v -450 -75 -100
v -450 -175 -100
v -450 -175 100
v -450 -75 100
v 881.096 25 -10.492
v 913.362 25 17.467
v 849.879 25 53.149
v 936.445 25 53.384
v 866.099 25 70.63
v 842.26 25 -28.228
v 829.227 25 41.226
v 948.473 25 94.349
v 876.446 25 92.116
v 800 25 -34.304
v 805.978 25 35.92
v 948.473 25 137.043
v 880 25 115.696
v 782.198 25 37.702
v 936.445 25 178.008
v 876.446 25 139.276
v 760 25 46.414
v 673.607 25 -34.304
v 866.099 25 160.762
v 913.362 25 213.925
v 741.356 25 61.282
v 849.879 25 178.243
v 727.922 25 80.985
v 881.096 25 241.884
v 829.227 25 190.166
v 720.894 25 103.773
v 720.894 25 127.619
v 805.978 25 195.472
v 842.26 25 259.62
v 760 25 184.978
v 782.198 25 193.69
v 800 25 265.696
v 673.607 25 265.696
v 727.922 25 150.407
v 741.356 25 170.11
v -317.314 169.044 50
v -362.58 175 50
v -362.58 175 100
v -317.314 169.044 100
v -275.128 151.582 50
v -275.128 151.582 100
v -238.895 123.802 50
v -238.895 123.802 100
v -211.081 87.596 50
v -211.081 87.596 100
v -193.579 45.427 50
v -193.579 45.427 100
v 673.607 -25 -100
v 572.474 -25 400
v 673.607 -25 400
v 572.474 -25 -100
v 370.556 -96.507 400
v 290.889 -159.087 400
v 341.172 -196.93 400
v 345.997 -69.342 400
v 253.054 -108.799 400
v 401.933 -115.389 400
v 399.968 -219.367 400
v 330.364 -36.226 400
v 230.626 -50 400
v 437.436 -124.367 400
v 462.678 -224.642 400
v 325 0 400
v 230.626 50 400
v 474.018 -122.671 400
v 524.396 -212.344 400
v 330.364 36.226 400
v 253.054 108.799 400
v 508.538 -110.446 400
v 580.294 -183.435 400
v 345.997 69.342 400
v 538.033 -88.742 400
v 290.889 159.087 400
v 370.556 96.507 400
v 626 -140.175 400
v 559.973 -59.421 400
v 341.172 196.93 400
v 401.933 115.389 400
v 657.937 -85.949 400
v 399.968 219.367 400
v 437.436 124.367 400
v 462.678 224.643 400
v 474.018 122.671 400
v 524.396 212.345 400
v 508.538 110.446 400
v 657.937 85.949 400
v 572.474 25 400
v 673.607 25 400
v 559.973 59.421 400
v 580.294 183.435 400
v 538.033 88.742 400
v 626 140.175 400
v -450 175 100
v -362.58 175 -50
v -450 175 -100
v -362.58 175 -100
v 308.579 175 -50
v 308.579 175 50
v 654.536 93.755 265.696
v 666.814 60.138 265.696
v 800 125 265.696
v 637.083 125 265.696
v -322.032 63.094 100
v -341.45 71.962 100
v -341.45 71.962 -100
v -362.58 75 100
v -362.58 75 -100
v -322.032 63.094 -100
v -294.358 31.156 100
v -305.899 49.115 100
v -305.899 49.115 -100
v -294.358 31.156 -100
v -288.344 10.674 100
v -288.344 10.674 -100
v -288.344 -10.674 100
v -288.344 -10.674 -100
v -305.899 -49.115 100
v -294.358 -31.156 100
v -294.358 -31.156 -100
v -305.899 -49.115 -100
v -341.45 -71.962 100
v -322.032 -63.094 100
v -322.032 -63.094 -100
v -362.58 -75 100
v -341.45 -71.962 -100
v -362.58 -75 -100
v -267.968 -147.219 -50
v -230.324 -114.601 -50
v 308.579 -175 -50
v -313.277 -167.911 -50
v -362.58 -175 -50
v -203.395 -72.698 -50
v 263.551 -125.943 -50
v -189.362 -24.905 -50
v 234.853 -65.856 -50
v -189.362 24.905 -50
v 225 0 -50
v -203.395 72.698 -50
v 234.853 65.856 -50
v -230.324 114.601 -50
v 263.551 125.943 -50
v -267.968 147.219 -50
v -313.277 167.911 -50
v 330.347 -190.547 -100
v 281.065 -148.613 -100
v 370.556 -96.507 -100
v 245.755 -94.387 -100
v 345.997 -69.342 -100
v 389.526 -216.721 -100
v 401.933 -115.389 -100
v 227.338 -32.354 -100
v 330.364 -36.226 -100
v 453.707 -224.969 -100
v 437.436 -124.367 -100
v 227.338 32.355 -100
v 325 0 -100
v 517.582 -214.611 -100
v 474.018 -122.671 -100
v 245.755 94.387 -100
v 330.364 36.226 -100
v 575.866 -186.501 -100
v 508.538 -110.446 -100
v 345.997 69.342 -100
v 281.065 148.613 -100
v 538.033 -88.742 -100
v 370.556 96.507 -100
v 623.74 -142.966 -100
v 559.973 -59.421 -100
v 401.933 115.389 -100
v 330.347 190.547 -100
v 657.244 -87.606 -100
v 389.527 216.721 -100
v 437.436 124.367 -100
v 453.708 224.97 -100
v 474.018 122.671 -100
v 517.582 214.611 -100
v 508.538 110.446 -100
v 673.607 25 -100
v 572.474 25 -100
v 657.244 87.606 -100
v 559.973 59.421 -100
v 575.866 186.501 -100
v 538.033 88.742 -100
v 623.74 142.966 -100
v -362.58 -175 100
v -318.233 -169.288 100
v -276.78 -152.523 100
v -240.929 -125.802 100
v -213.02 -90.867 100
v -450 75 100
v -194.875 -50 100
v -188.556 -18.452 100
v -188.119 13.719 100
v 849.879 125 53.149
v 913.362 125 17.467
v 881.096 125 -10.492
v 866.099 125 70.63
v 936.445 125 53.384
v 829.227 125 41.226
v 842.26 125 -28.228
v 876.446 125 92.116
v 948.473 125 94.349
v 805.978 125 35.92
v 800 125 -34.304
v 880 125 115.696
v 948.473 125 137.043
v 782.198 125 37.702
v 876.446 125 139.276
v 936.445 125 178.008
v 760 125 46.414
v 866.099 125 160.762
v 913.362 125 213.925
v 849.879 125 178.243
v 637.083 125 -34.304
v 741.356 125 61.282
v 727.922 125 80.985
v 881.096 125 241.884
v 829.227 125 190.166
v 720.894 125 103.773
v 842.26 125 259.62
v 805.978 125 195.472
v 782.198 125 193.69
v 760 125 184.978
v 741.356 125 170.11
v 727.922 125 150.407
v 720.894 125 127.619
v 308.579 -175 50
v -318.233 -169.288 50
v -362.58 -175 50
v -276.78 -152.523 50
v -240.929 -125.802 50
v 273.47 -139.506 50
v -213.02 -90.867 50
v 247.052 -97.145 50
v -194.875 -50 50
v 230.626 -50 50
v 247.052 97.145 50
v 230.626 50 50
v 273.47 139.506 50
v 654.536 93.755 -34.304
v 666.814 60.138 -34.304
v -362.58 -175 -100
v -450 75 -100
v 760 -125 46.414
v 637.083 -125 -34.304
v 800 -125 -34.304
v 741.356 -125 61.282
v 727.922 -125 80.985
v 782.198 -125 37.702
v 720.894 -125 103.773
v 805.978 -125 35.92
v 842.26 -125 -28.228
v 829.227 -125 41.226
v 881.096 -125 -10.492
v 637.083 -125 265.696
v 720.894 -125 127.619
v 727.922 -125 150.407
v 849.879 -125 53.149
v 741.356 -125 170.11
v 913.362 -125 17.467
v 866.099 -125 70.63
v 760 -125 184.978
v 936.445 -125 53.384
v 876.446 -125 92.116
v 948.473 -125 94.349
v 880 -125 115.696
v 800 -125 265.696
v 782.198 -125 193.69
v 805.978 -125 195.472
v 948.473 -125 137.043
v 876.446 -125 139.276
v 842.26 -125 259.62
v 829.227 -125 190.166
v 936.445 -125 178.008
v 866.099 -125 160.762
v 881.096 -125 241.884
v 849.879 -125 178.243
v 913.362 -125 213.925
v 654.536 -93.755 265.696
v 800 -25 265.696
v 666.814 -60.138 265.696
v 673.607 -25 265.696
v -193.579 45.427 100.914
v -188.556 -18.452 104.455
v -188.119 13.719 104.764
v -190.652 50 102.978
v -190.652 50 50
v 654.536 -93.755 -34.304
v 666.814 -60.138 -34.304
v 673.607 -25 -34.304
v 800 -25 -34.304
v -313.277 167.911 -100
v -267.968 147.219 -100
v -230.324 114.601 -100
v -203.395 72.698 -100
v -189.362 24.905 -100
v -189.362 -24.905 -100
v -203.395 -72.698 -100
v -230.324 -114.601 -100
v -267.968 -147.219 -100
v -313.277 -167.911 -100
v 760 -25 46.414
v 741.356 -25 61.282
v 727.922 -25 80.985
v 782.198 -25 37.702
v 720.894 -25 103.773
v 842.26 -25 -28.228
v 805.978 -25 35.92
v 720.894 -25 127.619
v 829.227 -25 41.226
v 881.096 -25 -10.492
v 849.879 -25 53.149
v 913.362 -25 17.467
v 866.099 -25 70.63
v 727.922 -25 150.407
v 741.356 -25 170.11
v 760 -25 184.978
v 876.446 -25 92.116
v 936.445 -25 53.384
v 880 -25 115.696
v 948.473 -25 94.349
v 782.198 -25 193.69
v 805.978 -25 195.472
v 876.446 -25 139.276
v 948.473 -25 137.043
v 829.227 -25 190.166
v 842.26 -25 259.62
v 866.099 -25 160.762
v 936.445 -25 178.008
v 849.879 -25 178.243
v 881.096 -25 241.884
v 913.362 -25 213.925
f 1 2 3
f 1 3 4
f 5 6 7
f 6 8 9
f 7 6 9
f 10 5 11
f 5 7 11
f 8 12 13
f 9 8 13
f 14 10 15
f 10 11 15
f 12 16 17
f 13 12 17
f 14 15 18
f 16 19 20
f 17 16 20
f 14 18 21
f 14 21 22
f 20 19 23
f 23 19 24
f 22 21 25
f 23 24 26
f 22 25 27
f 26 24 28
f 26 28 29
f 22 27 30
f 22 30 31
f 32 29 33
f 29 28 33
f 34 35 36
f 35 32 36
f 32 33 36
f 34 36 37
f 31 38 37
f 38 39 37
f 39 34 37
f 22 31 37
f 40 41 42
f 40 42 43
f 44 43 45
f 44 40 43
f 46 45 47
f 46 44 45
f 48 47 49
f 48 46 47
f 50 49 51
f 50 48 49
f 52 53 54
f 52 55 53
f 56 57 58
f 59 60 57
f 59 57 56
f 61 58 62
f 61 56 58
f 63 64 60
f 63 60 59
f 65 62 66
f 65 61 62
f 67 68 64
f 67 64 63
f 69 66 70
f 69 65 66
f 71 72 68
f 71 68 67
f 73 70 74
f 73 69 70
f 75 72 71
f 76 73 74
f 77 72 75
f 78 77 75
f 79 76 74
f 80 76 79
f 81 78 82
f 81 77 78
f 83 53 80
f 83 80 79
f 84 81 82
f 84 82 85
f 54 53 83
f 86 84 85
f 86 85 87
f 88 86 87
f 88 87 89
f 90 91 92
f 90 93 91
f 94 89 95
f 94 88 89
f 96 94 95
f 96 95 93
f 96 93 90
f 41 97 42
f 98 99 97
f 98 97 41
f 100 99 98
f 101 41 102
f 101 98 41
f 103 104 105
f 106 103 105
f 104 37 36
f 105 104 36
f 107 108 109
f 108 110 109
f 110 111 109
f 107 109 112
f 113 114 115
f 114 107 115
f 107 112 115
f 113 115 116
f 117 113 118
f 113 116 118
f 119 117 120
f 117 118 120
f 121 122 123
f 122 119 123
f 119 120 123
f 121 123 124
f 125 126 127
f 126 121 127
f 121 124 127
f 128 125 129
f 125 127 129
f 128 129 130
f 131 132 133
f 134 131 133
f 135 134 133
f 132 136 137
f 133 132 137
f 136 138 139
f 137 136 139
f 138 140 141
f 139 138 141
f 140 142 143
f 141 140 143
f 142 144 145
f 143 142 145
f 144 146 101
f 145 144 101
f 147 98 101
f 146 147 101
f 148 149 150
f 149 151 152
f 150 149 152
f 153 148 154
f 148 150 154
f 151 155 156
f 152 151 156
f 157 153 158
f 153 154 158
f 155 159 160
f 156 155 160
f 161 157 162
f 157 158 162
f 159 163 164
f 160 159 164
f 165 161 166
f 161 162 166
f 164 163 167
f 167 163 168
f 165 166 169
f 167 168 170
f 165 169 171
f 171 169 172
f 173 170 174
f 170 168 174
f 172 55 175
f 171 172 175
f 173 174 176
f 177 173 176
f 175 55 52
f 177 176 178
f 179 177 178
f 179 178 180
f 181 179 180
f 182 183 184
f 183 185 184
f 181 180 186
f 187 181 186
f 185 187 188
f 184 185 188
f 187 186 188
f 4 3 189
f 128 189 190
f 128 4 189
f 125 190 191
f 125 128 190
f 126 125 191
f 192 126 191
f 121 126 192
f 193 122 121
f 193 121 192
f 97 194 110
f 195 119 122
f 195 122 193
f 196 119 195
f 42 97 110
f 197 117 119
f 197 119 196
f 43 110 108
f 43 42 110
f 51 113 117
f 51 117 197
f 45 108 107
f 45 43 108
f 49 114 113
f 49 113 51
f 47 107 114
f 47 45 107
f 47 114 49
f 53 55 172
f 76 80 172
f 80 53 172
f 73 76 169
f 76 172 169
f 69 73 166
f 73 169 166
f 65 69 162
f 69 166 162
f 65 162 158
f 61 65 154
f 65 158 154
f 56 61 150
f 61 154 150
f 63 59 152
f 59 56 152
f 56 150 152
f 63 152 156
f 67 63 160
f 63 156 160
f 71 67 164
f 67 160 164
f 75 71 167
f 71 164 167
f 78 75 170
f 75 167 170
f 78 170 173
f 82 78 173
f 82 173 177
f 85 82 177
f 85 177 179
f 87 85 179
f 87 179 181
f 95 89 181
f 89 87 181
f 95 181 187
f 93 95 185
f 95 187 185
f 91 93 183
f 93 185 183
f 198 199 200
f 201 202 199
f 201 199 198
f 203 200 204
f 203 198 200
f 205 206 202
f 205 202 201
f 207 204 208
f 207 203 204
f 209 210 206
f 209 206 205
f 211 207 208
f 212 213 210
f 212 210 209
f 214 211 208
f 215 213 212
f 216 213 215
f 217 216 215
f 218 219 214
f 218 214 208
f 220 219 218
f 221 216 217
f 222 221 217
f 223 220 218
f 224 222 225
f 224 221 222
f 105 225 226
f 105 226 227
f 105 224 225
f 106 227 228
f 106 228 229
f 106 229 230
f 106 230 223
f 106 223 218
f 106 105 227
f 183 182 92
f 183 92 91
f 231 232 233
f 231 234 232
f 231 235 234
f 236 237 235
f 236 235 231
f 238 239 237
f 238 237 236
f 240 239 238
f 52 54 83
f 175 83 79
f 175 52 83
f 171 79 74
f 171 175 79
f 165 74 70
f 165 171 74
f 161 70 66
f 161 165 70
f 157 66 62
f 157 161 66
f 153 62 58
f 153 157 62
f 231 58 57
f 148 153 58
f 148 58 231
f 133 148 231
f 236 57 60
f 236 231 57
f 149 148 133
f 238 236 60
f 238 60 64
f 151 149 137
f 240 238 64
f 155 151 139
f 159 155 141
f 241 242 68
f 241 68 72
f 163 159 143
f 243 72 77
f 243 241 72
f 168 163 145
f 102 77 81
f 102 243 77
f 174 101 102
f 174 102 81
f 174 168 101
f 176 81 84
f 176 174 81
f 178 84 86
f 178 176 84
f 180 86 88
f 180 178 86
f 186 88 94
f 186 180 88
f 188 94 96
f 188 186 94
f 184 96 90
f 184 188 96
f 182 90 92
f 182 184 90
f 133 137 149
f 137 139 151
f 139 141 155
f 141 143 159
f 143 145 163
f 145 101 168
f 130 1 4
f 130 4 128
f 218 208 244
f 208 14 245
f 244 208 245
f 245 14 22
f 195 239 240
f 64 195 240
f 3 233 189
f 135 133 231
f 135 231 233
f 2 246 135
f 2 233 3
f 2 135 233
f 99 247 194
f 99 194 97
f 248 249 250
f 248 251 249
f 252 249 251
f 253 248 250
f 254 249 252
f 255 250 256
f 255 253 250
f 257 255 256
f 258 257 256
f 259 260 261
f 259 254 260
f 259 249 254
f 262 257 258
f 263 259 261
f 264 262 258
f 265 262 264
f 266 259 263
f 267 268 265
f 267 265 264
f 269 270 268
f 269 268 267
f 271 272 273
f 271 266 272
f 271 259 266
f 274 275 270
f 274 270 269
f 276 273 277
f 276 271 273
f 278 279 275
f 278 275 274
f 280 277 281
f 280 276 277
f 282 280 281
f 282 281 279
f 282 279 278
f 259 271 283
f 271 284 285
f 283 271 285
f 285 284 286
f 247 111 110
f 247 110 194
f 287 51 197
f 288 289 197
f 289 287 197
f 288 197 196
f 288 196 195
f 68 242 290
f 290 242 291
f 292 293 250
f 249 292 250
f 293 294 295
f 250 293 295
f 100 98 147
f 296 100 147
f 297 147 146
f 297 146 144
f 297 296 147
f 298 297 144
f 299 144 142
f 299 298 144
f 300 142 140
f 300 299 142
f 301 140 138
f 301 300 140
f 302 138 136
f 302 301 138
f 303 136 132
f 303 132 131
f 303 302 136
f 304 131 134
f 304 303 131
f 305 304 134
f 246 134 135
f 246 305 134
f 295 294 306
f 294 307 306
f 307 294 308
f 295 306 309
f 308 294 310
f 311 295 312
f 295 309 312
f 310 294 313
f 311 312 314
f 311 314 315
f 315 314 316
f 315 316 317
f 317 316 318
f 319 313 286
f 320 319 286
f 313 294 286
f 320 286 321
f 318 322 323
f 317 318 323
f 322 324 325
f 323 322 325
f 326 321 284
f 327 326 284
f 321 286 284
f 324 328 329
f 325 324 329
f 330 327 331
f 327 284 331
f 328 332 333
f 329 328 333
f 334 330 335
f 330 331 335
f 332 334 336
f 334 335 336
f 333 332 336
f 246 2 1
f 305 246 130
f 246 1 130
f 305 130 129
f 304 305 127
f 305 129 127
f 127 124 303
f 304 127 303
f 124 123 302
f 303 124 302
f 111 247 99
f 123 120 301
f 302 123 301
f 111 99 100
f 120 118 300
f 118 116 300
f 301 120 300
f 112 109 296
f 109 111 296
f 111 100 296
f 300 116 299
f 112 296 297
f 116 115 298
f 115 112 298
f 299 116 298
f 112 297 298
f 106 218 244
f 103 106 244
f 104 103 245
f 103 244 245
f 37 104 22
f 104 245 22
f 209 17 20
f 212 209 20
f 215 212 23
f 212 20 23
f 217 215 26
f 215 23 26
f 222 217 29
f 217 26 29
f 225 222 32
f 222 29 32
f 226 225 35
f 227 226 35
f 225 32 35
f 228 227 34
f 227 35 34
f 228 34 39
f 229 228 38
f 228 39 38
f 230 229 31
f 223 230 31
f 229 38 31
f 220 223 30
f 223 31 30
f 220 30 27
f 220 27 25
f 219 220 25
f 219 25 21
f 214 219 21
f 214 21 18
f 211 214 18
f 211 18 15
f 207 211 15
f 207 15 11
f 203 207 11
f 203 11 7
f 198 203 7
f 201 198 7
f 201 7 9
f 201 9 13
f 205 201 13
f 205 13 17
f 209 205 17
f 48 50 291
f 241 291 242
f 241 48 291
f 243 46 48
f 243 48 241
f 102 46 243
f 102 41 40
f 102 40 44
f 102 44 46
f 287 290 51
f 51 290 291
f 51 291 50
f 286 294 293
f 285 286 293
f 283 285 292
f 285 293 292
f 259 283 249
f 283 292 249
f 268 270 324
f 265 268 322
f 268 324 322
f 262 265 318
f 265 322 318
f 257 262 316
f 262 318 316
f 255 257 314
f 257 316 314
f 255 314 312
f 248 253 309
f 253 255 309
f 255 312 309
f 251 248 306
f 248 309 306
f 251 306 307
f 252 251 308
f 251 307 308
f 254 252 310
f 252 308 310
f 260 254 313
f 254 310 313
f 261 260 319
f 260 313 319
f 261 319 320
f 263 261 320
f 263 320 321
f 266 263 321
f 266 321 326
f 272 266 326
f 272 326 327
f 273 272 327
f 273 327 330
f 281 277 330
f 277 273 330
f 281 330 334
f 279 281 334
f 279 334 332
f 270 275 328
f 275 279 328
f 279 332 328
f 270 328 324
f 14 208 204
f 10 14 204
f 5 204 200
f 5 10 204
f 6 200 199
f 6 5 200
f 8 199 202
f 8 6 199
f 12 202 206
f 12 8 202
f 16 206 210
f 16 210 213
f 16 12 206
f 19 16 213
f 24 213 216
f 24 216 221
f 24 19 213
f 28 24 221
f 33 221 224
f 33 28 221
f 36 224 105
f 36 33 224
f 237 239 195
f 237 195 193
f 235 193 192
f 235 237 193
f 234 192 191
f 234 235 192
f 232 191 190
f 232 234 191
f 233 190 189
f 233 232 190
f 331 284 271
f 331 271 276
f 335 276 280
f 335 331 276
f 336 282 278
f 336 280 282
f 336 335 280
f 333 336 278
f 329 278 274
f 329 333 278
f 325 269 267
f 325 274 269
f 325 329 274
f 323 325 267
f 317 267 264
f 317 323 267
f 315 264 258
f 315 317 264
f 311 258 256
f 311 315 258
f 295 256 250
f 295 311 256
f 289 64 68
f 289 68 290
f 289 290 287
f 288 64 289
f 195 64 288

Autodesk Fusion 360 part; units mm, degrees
sketch "Sketch1" plane through (0, 0, 0) normal (0, 0, 1) x (1, 0, 0)
  line L0 (308.5786, -175) -> (-450, -175)
  line L1 (-450, 175) -> (308.5786, 175)
  line L2 (-362.5803, 75) -> (-450, 75)
  line L3 (-450, -75) -> (-362.5803, -75)
  line L4 (572.4745, -25) -> (673.6068, -25)
  line L5 (673.6068, 25) -> (572.4745, 25)
  line L6 (-194.8752, -50) -> (230.6259, -50)
  line L7 (230.6259, 50) -> (-190.6515, 50)
  arc A0 (-362.5803, -175) -> (-362.5803, 175) centre (-362.5803, 0) ccw
  arc A1 (-362.5803, -75) -> (-362.5803, 75) centre (-362.5803, 0) ccw
  line L8 (-450, -175) -> (-450, -75)
  line L9 (-450, 75) -> (-450, 175)
  line L10 (-187.5803, 0) -> (-287.5803, 0) construction
  line L11 (-437.5803, 0) -> (-450, 0) construction
  line L12 (0, 0) -> (251.3485, 0)
  line L13 (-190.6515, 50) -> (-193.5791, 45.4268)
  arc A2 (673.6068, 25) -> (674.4966, -15.0423) centre (450, 0) ccw
  arc A3 (573.9211, 16.3875) -> (573.9211, -16.3875) centre (450, 0) ccw
  dimension "d2" = 350
  dimension "d3" = 150
  dimension "d4" = 350
  dimension "d5" = 250
  dimension "d6" = 450
  dimension "d8" = 150
extrude "Extrude1" add sketch "Sketch1" along normal mid plane 100 contours L0 L6 A0 A2 | L6 L7 A0 L13 A2 | L1 L7 A0 L13 A2 makes body 1
extrude "Extrude2" add sketch "Sketch1" along normal mid plane 200 contours L0 L1 L2 L3 A0 A1 L8 L9 bodies 1
extrude "Extrude3" add sketch "Sketch1" along normal blind 400 and the other way blind 100 contours L4 L5 A2 A3 bodies 1
extrude "Extrude4" add sketch "Sketch1" along normal blind 400 contours L6 L7 A0 L13 A2 bodies 1
sketch "Sketch2" plane through (0, -50, 0) normal (0, -1, 0) x (1, 0, 0)
  line L0 (-194.8752, 50) -> (230.6259, 50)
  line L1 (230.6259, 50) -> (230.6259, 400)
  line L2 (230.6259, 400) -> (-194.8752, 400)
  line L3 (-194.8752, 400) -> (-194.8752, 100)
  line L4 (-194.8752, 100) -> (-194.8752, 50)
  line L5 (230.6259, 400) -> (-194.8752, 100)
  line L6 (-194.8752, 100) -> (-194.8752, 400)
  line L7 (230.6259, 400) -> (-194.8752, 400)
extrude "Extrude5" cut sketch "Sketch2" against normal blind 450 contours L2 L3 L5 L6 L7 bodies 1
sketch "Sketch3" plane through (0, -50, 0) normal (0, -1, 0) x (1, 0, 0)
  line L0 (230.6259, 400) -> (-194.8752, 100)
  line L1 (-194.8752, 100) -> (-194.8752, 50)
  line L2 (-194.8752, 50) -> (230.6259, 50)
  line L3 (230.6259, 50) -> (230.6259, 400)
  circle A0 centre (800, 115.696) radius 80
  line L4 (800, 265.696) -> (410, 265.696)
  line L5 (410, 265.696) -> (410, -34.304)
  line L6 (410, -34.304) -> (800, -34.304)
  line L7 (800, -34.304) -> (800, 265.696)
  arc A1 (800, -34.304) -> (800, 265.696) centre (800, 115.696) ccw
  point P0 (-450, -100)
  point P1 (673.6068, -100)
  dimension "d25" = 160
  dimension "d26" = 300
  dimension "d27" = 390
  dimension "d28" = 300
  dimension "d29" = 1250
  dimension "d30" = 250
extrude "Extrude6" add sketch "Sketch3" along normal blind 100 from surface at -25 separate body contours A0 L7 A1 | A0 L4 L5 L6 L7 makes body 2
combine "Combine1" operation cut target body 2 tool bodies 1 keep tools makes body 3 at (557.7893, -63.2967, 165.696)
delete_body "RemoveBody1" bodies 3
mirror "Mirror1" about plane through (0, 0, 0) normal (0, 1, 0) of bodies 2 makes body 4
